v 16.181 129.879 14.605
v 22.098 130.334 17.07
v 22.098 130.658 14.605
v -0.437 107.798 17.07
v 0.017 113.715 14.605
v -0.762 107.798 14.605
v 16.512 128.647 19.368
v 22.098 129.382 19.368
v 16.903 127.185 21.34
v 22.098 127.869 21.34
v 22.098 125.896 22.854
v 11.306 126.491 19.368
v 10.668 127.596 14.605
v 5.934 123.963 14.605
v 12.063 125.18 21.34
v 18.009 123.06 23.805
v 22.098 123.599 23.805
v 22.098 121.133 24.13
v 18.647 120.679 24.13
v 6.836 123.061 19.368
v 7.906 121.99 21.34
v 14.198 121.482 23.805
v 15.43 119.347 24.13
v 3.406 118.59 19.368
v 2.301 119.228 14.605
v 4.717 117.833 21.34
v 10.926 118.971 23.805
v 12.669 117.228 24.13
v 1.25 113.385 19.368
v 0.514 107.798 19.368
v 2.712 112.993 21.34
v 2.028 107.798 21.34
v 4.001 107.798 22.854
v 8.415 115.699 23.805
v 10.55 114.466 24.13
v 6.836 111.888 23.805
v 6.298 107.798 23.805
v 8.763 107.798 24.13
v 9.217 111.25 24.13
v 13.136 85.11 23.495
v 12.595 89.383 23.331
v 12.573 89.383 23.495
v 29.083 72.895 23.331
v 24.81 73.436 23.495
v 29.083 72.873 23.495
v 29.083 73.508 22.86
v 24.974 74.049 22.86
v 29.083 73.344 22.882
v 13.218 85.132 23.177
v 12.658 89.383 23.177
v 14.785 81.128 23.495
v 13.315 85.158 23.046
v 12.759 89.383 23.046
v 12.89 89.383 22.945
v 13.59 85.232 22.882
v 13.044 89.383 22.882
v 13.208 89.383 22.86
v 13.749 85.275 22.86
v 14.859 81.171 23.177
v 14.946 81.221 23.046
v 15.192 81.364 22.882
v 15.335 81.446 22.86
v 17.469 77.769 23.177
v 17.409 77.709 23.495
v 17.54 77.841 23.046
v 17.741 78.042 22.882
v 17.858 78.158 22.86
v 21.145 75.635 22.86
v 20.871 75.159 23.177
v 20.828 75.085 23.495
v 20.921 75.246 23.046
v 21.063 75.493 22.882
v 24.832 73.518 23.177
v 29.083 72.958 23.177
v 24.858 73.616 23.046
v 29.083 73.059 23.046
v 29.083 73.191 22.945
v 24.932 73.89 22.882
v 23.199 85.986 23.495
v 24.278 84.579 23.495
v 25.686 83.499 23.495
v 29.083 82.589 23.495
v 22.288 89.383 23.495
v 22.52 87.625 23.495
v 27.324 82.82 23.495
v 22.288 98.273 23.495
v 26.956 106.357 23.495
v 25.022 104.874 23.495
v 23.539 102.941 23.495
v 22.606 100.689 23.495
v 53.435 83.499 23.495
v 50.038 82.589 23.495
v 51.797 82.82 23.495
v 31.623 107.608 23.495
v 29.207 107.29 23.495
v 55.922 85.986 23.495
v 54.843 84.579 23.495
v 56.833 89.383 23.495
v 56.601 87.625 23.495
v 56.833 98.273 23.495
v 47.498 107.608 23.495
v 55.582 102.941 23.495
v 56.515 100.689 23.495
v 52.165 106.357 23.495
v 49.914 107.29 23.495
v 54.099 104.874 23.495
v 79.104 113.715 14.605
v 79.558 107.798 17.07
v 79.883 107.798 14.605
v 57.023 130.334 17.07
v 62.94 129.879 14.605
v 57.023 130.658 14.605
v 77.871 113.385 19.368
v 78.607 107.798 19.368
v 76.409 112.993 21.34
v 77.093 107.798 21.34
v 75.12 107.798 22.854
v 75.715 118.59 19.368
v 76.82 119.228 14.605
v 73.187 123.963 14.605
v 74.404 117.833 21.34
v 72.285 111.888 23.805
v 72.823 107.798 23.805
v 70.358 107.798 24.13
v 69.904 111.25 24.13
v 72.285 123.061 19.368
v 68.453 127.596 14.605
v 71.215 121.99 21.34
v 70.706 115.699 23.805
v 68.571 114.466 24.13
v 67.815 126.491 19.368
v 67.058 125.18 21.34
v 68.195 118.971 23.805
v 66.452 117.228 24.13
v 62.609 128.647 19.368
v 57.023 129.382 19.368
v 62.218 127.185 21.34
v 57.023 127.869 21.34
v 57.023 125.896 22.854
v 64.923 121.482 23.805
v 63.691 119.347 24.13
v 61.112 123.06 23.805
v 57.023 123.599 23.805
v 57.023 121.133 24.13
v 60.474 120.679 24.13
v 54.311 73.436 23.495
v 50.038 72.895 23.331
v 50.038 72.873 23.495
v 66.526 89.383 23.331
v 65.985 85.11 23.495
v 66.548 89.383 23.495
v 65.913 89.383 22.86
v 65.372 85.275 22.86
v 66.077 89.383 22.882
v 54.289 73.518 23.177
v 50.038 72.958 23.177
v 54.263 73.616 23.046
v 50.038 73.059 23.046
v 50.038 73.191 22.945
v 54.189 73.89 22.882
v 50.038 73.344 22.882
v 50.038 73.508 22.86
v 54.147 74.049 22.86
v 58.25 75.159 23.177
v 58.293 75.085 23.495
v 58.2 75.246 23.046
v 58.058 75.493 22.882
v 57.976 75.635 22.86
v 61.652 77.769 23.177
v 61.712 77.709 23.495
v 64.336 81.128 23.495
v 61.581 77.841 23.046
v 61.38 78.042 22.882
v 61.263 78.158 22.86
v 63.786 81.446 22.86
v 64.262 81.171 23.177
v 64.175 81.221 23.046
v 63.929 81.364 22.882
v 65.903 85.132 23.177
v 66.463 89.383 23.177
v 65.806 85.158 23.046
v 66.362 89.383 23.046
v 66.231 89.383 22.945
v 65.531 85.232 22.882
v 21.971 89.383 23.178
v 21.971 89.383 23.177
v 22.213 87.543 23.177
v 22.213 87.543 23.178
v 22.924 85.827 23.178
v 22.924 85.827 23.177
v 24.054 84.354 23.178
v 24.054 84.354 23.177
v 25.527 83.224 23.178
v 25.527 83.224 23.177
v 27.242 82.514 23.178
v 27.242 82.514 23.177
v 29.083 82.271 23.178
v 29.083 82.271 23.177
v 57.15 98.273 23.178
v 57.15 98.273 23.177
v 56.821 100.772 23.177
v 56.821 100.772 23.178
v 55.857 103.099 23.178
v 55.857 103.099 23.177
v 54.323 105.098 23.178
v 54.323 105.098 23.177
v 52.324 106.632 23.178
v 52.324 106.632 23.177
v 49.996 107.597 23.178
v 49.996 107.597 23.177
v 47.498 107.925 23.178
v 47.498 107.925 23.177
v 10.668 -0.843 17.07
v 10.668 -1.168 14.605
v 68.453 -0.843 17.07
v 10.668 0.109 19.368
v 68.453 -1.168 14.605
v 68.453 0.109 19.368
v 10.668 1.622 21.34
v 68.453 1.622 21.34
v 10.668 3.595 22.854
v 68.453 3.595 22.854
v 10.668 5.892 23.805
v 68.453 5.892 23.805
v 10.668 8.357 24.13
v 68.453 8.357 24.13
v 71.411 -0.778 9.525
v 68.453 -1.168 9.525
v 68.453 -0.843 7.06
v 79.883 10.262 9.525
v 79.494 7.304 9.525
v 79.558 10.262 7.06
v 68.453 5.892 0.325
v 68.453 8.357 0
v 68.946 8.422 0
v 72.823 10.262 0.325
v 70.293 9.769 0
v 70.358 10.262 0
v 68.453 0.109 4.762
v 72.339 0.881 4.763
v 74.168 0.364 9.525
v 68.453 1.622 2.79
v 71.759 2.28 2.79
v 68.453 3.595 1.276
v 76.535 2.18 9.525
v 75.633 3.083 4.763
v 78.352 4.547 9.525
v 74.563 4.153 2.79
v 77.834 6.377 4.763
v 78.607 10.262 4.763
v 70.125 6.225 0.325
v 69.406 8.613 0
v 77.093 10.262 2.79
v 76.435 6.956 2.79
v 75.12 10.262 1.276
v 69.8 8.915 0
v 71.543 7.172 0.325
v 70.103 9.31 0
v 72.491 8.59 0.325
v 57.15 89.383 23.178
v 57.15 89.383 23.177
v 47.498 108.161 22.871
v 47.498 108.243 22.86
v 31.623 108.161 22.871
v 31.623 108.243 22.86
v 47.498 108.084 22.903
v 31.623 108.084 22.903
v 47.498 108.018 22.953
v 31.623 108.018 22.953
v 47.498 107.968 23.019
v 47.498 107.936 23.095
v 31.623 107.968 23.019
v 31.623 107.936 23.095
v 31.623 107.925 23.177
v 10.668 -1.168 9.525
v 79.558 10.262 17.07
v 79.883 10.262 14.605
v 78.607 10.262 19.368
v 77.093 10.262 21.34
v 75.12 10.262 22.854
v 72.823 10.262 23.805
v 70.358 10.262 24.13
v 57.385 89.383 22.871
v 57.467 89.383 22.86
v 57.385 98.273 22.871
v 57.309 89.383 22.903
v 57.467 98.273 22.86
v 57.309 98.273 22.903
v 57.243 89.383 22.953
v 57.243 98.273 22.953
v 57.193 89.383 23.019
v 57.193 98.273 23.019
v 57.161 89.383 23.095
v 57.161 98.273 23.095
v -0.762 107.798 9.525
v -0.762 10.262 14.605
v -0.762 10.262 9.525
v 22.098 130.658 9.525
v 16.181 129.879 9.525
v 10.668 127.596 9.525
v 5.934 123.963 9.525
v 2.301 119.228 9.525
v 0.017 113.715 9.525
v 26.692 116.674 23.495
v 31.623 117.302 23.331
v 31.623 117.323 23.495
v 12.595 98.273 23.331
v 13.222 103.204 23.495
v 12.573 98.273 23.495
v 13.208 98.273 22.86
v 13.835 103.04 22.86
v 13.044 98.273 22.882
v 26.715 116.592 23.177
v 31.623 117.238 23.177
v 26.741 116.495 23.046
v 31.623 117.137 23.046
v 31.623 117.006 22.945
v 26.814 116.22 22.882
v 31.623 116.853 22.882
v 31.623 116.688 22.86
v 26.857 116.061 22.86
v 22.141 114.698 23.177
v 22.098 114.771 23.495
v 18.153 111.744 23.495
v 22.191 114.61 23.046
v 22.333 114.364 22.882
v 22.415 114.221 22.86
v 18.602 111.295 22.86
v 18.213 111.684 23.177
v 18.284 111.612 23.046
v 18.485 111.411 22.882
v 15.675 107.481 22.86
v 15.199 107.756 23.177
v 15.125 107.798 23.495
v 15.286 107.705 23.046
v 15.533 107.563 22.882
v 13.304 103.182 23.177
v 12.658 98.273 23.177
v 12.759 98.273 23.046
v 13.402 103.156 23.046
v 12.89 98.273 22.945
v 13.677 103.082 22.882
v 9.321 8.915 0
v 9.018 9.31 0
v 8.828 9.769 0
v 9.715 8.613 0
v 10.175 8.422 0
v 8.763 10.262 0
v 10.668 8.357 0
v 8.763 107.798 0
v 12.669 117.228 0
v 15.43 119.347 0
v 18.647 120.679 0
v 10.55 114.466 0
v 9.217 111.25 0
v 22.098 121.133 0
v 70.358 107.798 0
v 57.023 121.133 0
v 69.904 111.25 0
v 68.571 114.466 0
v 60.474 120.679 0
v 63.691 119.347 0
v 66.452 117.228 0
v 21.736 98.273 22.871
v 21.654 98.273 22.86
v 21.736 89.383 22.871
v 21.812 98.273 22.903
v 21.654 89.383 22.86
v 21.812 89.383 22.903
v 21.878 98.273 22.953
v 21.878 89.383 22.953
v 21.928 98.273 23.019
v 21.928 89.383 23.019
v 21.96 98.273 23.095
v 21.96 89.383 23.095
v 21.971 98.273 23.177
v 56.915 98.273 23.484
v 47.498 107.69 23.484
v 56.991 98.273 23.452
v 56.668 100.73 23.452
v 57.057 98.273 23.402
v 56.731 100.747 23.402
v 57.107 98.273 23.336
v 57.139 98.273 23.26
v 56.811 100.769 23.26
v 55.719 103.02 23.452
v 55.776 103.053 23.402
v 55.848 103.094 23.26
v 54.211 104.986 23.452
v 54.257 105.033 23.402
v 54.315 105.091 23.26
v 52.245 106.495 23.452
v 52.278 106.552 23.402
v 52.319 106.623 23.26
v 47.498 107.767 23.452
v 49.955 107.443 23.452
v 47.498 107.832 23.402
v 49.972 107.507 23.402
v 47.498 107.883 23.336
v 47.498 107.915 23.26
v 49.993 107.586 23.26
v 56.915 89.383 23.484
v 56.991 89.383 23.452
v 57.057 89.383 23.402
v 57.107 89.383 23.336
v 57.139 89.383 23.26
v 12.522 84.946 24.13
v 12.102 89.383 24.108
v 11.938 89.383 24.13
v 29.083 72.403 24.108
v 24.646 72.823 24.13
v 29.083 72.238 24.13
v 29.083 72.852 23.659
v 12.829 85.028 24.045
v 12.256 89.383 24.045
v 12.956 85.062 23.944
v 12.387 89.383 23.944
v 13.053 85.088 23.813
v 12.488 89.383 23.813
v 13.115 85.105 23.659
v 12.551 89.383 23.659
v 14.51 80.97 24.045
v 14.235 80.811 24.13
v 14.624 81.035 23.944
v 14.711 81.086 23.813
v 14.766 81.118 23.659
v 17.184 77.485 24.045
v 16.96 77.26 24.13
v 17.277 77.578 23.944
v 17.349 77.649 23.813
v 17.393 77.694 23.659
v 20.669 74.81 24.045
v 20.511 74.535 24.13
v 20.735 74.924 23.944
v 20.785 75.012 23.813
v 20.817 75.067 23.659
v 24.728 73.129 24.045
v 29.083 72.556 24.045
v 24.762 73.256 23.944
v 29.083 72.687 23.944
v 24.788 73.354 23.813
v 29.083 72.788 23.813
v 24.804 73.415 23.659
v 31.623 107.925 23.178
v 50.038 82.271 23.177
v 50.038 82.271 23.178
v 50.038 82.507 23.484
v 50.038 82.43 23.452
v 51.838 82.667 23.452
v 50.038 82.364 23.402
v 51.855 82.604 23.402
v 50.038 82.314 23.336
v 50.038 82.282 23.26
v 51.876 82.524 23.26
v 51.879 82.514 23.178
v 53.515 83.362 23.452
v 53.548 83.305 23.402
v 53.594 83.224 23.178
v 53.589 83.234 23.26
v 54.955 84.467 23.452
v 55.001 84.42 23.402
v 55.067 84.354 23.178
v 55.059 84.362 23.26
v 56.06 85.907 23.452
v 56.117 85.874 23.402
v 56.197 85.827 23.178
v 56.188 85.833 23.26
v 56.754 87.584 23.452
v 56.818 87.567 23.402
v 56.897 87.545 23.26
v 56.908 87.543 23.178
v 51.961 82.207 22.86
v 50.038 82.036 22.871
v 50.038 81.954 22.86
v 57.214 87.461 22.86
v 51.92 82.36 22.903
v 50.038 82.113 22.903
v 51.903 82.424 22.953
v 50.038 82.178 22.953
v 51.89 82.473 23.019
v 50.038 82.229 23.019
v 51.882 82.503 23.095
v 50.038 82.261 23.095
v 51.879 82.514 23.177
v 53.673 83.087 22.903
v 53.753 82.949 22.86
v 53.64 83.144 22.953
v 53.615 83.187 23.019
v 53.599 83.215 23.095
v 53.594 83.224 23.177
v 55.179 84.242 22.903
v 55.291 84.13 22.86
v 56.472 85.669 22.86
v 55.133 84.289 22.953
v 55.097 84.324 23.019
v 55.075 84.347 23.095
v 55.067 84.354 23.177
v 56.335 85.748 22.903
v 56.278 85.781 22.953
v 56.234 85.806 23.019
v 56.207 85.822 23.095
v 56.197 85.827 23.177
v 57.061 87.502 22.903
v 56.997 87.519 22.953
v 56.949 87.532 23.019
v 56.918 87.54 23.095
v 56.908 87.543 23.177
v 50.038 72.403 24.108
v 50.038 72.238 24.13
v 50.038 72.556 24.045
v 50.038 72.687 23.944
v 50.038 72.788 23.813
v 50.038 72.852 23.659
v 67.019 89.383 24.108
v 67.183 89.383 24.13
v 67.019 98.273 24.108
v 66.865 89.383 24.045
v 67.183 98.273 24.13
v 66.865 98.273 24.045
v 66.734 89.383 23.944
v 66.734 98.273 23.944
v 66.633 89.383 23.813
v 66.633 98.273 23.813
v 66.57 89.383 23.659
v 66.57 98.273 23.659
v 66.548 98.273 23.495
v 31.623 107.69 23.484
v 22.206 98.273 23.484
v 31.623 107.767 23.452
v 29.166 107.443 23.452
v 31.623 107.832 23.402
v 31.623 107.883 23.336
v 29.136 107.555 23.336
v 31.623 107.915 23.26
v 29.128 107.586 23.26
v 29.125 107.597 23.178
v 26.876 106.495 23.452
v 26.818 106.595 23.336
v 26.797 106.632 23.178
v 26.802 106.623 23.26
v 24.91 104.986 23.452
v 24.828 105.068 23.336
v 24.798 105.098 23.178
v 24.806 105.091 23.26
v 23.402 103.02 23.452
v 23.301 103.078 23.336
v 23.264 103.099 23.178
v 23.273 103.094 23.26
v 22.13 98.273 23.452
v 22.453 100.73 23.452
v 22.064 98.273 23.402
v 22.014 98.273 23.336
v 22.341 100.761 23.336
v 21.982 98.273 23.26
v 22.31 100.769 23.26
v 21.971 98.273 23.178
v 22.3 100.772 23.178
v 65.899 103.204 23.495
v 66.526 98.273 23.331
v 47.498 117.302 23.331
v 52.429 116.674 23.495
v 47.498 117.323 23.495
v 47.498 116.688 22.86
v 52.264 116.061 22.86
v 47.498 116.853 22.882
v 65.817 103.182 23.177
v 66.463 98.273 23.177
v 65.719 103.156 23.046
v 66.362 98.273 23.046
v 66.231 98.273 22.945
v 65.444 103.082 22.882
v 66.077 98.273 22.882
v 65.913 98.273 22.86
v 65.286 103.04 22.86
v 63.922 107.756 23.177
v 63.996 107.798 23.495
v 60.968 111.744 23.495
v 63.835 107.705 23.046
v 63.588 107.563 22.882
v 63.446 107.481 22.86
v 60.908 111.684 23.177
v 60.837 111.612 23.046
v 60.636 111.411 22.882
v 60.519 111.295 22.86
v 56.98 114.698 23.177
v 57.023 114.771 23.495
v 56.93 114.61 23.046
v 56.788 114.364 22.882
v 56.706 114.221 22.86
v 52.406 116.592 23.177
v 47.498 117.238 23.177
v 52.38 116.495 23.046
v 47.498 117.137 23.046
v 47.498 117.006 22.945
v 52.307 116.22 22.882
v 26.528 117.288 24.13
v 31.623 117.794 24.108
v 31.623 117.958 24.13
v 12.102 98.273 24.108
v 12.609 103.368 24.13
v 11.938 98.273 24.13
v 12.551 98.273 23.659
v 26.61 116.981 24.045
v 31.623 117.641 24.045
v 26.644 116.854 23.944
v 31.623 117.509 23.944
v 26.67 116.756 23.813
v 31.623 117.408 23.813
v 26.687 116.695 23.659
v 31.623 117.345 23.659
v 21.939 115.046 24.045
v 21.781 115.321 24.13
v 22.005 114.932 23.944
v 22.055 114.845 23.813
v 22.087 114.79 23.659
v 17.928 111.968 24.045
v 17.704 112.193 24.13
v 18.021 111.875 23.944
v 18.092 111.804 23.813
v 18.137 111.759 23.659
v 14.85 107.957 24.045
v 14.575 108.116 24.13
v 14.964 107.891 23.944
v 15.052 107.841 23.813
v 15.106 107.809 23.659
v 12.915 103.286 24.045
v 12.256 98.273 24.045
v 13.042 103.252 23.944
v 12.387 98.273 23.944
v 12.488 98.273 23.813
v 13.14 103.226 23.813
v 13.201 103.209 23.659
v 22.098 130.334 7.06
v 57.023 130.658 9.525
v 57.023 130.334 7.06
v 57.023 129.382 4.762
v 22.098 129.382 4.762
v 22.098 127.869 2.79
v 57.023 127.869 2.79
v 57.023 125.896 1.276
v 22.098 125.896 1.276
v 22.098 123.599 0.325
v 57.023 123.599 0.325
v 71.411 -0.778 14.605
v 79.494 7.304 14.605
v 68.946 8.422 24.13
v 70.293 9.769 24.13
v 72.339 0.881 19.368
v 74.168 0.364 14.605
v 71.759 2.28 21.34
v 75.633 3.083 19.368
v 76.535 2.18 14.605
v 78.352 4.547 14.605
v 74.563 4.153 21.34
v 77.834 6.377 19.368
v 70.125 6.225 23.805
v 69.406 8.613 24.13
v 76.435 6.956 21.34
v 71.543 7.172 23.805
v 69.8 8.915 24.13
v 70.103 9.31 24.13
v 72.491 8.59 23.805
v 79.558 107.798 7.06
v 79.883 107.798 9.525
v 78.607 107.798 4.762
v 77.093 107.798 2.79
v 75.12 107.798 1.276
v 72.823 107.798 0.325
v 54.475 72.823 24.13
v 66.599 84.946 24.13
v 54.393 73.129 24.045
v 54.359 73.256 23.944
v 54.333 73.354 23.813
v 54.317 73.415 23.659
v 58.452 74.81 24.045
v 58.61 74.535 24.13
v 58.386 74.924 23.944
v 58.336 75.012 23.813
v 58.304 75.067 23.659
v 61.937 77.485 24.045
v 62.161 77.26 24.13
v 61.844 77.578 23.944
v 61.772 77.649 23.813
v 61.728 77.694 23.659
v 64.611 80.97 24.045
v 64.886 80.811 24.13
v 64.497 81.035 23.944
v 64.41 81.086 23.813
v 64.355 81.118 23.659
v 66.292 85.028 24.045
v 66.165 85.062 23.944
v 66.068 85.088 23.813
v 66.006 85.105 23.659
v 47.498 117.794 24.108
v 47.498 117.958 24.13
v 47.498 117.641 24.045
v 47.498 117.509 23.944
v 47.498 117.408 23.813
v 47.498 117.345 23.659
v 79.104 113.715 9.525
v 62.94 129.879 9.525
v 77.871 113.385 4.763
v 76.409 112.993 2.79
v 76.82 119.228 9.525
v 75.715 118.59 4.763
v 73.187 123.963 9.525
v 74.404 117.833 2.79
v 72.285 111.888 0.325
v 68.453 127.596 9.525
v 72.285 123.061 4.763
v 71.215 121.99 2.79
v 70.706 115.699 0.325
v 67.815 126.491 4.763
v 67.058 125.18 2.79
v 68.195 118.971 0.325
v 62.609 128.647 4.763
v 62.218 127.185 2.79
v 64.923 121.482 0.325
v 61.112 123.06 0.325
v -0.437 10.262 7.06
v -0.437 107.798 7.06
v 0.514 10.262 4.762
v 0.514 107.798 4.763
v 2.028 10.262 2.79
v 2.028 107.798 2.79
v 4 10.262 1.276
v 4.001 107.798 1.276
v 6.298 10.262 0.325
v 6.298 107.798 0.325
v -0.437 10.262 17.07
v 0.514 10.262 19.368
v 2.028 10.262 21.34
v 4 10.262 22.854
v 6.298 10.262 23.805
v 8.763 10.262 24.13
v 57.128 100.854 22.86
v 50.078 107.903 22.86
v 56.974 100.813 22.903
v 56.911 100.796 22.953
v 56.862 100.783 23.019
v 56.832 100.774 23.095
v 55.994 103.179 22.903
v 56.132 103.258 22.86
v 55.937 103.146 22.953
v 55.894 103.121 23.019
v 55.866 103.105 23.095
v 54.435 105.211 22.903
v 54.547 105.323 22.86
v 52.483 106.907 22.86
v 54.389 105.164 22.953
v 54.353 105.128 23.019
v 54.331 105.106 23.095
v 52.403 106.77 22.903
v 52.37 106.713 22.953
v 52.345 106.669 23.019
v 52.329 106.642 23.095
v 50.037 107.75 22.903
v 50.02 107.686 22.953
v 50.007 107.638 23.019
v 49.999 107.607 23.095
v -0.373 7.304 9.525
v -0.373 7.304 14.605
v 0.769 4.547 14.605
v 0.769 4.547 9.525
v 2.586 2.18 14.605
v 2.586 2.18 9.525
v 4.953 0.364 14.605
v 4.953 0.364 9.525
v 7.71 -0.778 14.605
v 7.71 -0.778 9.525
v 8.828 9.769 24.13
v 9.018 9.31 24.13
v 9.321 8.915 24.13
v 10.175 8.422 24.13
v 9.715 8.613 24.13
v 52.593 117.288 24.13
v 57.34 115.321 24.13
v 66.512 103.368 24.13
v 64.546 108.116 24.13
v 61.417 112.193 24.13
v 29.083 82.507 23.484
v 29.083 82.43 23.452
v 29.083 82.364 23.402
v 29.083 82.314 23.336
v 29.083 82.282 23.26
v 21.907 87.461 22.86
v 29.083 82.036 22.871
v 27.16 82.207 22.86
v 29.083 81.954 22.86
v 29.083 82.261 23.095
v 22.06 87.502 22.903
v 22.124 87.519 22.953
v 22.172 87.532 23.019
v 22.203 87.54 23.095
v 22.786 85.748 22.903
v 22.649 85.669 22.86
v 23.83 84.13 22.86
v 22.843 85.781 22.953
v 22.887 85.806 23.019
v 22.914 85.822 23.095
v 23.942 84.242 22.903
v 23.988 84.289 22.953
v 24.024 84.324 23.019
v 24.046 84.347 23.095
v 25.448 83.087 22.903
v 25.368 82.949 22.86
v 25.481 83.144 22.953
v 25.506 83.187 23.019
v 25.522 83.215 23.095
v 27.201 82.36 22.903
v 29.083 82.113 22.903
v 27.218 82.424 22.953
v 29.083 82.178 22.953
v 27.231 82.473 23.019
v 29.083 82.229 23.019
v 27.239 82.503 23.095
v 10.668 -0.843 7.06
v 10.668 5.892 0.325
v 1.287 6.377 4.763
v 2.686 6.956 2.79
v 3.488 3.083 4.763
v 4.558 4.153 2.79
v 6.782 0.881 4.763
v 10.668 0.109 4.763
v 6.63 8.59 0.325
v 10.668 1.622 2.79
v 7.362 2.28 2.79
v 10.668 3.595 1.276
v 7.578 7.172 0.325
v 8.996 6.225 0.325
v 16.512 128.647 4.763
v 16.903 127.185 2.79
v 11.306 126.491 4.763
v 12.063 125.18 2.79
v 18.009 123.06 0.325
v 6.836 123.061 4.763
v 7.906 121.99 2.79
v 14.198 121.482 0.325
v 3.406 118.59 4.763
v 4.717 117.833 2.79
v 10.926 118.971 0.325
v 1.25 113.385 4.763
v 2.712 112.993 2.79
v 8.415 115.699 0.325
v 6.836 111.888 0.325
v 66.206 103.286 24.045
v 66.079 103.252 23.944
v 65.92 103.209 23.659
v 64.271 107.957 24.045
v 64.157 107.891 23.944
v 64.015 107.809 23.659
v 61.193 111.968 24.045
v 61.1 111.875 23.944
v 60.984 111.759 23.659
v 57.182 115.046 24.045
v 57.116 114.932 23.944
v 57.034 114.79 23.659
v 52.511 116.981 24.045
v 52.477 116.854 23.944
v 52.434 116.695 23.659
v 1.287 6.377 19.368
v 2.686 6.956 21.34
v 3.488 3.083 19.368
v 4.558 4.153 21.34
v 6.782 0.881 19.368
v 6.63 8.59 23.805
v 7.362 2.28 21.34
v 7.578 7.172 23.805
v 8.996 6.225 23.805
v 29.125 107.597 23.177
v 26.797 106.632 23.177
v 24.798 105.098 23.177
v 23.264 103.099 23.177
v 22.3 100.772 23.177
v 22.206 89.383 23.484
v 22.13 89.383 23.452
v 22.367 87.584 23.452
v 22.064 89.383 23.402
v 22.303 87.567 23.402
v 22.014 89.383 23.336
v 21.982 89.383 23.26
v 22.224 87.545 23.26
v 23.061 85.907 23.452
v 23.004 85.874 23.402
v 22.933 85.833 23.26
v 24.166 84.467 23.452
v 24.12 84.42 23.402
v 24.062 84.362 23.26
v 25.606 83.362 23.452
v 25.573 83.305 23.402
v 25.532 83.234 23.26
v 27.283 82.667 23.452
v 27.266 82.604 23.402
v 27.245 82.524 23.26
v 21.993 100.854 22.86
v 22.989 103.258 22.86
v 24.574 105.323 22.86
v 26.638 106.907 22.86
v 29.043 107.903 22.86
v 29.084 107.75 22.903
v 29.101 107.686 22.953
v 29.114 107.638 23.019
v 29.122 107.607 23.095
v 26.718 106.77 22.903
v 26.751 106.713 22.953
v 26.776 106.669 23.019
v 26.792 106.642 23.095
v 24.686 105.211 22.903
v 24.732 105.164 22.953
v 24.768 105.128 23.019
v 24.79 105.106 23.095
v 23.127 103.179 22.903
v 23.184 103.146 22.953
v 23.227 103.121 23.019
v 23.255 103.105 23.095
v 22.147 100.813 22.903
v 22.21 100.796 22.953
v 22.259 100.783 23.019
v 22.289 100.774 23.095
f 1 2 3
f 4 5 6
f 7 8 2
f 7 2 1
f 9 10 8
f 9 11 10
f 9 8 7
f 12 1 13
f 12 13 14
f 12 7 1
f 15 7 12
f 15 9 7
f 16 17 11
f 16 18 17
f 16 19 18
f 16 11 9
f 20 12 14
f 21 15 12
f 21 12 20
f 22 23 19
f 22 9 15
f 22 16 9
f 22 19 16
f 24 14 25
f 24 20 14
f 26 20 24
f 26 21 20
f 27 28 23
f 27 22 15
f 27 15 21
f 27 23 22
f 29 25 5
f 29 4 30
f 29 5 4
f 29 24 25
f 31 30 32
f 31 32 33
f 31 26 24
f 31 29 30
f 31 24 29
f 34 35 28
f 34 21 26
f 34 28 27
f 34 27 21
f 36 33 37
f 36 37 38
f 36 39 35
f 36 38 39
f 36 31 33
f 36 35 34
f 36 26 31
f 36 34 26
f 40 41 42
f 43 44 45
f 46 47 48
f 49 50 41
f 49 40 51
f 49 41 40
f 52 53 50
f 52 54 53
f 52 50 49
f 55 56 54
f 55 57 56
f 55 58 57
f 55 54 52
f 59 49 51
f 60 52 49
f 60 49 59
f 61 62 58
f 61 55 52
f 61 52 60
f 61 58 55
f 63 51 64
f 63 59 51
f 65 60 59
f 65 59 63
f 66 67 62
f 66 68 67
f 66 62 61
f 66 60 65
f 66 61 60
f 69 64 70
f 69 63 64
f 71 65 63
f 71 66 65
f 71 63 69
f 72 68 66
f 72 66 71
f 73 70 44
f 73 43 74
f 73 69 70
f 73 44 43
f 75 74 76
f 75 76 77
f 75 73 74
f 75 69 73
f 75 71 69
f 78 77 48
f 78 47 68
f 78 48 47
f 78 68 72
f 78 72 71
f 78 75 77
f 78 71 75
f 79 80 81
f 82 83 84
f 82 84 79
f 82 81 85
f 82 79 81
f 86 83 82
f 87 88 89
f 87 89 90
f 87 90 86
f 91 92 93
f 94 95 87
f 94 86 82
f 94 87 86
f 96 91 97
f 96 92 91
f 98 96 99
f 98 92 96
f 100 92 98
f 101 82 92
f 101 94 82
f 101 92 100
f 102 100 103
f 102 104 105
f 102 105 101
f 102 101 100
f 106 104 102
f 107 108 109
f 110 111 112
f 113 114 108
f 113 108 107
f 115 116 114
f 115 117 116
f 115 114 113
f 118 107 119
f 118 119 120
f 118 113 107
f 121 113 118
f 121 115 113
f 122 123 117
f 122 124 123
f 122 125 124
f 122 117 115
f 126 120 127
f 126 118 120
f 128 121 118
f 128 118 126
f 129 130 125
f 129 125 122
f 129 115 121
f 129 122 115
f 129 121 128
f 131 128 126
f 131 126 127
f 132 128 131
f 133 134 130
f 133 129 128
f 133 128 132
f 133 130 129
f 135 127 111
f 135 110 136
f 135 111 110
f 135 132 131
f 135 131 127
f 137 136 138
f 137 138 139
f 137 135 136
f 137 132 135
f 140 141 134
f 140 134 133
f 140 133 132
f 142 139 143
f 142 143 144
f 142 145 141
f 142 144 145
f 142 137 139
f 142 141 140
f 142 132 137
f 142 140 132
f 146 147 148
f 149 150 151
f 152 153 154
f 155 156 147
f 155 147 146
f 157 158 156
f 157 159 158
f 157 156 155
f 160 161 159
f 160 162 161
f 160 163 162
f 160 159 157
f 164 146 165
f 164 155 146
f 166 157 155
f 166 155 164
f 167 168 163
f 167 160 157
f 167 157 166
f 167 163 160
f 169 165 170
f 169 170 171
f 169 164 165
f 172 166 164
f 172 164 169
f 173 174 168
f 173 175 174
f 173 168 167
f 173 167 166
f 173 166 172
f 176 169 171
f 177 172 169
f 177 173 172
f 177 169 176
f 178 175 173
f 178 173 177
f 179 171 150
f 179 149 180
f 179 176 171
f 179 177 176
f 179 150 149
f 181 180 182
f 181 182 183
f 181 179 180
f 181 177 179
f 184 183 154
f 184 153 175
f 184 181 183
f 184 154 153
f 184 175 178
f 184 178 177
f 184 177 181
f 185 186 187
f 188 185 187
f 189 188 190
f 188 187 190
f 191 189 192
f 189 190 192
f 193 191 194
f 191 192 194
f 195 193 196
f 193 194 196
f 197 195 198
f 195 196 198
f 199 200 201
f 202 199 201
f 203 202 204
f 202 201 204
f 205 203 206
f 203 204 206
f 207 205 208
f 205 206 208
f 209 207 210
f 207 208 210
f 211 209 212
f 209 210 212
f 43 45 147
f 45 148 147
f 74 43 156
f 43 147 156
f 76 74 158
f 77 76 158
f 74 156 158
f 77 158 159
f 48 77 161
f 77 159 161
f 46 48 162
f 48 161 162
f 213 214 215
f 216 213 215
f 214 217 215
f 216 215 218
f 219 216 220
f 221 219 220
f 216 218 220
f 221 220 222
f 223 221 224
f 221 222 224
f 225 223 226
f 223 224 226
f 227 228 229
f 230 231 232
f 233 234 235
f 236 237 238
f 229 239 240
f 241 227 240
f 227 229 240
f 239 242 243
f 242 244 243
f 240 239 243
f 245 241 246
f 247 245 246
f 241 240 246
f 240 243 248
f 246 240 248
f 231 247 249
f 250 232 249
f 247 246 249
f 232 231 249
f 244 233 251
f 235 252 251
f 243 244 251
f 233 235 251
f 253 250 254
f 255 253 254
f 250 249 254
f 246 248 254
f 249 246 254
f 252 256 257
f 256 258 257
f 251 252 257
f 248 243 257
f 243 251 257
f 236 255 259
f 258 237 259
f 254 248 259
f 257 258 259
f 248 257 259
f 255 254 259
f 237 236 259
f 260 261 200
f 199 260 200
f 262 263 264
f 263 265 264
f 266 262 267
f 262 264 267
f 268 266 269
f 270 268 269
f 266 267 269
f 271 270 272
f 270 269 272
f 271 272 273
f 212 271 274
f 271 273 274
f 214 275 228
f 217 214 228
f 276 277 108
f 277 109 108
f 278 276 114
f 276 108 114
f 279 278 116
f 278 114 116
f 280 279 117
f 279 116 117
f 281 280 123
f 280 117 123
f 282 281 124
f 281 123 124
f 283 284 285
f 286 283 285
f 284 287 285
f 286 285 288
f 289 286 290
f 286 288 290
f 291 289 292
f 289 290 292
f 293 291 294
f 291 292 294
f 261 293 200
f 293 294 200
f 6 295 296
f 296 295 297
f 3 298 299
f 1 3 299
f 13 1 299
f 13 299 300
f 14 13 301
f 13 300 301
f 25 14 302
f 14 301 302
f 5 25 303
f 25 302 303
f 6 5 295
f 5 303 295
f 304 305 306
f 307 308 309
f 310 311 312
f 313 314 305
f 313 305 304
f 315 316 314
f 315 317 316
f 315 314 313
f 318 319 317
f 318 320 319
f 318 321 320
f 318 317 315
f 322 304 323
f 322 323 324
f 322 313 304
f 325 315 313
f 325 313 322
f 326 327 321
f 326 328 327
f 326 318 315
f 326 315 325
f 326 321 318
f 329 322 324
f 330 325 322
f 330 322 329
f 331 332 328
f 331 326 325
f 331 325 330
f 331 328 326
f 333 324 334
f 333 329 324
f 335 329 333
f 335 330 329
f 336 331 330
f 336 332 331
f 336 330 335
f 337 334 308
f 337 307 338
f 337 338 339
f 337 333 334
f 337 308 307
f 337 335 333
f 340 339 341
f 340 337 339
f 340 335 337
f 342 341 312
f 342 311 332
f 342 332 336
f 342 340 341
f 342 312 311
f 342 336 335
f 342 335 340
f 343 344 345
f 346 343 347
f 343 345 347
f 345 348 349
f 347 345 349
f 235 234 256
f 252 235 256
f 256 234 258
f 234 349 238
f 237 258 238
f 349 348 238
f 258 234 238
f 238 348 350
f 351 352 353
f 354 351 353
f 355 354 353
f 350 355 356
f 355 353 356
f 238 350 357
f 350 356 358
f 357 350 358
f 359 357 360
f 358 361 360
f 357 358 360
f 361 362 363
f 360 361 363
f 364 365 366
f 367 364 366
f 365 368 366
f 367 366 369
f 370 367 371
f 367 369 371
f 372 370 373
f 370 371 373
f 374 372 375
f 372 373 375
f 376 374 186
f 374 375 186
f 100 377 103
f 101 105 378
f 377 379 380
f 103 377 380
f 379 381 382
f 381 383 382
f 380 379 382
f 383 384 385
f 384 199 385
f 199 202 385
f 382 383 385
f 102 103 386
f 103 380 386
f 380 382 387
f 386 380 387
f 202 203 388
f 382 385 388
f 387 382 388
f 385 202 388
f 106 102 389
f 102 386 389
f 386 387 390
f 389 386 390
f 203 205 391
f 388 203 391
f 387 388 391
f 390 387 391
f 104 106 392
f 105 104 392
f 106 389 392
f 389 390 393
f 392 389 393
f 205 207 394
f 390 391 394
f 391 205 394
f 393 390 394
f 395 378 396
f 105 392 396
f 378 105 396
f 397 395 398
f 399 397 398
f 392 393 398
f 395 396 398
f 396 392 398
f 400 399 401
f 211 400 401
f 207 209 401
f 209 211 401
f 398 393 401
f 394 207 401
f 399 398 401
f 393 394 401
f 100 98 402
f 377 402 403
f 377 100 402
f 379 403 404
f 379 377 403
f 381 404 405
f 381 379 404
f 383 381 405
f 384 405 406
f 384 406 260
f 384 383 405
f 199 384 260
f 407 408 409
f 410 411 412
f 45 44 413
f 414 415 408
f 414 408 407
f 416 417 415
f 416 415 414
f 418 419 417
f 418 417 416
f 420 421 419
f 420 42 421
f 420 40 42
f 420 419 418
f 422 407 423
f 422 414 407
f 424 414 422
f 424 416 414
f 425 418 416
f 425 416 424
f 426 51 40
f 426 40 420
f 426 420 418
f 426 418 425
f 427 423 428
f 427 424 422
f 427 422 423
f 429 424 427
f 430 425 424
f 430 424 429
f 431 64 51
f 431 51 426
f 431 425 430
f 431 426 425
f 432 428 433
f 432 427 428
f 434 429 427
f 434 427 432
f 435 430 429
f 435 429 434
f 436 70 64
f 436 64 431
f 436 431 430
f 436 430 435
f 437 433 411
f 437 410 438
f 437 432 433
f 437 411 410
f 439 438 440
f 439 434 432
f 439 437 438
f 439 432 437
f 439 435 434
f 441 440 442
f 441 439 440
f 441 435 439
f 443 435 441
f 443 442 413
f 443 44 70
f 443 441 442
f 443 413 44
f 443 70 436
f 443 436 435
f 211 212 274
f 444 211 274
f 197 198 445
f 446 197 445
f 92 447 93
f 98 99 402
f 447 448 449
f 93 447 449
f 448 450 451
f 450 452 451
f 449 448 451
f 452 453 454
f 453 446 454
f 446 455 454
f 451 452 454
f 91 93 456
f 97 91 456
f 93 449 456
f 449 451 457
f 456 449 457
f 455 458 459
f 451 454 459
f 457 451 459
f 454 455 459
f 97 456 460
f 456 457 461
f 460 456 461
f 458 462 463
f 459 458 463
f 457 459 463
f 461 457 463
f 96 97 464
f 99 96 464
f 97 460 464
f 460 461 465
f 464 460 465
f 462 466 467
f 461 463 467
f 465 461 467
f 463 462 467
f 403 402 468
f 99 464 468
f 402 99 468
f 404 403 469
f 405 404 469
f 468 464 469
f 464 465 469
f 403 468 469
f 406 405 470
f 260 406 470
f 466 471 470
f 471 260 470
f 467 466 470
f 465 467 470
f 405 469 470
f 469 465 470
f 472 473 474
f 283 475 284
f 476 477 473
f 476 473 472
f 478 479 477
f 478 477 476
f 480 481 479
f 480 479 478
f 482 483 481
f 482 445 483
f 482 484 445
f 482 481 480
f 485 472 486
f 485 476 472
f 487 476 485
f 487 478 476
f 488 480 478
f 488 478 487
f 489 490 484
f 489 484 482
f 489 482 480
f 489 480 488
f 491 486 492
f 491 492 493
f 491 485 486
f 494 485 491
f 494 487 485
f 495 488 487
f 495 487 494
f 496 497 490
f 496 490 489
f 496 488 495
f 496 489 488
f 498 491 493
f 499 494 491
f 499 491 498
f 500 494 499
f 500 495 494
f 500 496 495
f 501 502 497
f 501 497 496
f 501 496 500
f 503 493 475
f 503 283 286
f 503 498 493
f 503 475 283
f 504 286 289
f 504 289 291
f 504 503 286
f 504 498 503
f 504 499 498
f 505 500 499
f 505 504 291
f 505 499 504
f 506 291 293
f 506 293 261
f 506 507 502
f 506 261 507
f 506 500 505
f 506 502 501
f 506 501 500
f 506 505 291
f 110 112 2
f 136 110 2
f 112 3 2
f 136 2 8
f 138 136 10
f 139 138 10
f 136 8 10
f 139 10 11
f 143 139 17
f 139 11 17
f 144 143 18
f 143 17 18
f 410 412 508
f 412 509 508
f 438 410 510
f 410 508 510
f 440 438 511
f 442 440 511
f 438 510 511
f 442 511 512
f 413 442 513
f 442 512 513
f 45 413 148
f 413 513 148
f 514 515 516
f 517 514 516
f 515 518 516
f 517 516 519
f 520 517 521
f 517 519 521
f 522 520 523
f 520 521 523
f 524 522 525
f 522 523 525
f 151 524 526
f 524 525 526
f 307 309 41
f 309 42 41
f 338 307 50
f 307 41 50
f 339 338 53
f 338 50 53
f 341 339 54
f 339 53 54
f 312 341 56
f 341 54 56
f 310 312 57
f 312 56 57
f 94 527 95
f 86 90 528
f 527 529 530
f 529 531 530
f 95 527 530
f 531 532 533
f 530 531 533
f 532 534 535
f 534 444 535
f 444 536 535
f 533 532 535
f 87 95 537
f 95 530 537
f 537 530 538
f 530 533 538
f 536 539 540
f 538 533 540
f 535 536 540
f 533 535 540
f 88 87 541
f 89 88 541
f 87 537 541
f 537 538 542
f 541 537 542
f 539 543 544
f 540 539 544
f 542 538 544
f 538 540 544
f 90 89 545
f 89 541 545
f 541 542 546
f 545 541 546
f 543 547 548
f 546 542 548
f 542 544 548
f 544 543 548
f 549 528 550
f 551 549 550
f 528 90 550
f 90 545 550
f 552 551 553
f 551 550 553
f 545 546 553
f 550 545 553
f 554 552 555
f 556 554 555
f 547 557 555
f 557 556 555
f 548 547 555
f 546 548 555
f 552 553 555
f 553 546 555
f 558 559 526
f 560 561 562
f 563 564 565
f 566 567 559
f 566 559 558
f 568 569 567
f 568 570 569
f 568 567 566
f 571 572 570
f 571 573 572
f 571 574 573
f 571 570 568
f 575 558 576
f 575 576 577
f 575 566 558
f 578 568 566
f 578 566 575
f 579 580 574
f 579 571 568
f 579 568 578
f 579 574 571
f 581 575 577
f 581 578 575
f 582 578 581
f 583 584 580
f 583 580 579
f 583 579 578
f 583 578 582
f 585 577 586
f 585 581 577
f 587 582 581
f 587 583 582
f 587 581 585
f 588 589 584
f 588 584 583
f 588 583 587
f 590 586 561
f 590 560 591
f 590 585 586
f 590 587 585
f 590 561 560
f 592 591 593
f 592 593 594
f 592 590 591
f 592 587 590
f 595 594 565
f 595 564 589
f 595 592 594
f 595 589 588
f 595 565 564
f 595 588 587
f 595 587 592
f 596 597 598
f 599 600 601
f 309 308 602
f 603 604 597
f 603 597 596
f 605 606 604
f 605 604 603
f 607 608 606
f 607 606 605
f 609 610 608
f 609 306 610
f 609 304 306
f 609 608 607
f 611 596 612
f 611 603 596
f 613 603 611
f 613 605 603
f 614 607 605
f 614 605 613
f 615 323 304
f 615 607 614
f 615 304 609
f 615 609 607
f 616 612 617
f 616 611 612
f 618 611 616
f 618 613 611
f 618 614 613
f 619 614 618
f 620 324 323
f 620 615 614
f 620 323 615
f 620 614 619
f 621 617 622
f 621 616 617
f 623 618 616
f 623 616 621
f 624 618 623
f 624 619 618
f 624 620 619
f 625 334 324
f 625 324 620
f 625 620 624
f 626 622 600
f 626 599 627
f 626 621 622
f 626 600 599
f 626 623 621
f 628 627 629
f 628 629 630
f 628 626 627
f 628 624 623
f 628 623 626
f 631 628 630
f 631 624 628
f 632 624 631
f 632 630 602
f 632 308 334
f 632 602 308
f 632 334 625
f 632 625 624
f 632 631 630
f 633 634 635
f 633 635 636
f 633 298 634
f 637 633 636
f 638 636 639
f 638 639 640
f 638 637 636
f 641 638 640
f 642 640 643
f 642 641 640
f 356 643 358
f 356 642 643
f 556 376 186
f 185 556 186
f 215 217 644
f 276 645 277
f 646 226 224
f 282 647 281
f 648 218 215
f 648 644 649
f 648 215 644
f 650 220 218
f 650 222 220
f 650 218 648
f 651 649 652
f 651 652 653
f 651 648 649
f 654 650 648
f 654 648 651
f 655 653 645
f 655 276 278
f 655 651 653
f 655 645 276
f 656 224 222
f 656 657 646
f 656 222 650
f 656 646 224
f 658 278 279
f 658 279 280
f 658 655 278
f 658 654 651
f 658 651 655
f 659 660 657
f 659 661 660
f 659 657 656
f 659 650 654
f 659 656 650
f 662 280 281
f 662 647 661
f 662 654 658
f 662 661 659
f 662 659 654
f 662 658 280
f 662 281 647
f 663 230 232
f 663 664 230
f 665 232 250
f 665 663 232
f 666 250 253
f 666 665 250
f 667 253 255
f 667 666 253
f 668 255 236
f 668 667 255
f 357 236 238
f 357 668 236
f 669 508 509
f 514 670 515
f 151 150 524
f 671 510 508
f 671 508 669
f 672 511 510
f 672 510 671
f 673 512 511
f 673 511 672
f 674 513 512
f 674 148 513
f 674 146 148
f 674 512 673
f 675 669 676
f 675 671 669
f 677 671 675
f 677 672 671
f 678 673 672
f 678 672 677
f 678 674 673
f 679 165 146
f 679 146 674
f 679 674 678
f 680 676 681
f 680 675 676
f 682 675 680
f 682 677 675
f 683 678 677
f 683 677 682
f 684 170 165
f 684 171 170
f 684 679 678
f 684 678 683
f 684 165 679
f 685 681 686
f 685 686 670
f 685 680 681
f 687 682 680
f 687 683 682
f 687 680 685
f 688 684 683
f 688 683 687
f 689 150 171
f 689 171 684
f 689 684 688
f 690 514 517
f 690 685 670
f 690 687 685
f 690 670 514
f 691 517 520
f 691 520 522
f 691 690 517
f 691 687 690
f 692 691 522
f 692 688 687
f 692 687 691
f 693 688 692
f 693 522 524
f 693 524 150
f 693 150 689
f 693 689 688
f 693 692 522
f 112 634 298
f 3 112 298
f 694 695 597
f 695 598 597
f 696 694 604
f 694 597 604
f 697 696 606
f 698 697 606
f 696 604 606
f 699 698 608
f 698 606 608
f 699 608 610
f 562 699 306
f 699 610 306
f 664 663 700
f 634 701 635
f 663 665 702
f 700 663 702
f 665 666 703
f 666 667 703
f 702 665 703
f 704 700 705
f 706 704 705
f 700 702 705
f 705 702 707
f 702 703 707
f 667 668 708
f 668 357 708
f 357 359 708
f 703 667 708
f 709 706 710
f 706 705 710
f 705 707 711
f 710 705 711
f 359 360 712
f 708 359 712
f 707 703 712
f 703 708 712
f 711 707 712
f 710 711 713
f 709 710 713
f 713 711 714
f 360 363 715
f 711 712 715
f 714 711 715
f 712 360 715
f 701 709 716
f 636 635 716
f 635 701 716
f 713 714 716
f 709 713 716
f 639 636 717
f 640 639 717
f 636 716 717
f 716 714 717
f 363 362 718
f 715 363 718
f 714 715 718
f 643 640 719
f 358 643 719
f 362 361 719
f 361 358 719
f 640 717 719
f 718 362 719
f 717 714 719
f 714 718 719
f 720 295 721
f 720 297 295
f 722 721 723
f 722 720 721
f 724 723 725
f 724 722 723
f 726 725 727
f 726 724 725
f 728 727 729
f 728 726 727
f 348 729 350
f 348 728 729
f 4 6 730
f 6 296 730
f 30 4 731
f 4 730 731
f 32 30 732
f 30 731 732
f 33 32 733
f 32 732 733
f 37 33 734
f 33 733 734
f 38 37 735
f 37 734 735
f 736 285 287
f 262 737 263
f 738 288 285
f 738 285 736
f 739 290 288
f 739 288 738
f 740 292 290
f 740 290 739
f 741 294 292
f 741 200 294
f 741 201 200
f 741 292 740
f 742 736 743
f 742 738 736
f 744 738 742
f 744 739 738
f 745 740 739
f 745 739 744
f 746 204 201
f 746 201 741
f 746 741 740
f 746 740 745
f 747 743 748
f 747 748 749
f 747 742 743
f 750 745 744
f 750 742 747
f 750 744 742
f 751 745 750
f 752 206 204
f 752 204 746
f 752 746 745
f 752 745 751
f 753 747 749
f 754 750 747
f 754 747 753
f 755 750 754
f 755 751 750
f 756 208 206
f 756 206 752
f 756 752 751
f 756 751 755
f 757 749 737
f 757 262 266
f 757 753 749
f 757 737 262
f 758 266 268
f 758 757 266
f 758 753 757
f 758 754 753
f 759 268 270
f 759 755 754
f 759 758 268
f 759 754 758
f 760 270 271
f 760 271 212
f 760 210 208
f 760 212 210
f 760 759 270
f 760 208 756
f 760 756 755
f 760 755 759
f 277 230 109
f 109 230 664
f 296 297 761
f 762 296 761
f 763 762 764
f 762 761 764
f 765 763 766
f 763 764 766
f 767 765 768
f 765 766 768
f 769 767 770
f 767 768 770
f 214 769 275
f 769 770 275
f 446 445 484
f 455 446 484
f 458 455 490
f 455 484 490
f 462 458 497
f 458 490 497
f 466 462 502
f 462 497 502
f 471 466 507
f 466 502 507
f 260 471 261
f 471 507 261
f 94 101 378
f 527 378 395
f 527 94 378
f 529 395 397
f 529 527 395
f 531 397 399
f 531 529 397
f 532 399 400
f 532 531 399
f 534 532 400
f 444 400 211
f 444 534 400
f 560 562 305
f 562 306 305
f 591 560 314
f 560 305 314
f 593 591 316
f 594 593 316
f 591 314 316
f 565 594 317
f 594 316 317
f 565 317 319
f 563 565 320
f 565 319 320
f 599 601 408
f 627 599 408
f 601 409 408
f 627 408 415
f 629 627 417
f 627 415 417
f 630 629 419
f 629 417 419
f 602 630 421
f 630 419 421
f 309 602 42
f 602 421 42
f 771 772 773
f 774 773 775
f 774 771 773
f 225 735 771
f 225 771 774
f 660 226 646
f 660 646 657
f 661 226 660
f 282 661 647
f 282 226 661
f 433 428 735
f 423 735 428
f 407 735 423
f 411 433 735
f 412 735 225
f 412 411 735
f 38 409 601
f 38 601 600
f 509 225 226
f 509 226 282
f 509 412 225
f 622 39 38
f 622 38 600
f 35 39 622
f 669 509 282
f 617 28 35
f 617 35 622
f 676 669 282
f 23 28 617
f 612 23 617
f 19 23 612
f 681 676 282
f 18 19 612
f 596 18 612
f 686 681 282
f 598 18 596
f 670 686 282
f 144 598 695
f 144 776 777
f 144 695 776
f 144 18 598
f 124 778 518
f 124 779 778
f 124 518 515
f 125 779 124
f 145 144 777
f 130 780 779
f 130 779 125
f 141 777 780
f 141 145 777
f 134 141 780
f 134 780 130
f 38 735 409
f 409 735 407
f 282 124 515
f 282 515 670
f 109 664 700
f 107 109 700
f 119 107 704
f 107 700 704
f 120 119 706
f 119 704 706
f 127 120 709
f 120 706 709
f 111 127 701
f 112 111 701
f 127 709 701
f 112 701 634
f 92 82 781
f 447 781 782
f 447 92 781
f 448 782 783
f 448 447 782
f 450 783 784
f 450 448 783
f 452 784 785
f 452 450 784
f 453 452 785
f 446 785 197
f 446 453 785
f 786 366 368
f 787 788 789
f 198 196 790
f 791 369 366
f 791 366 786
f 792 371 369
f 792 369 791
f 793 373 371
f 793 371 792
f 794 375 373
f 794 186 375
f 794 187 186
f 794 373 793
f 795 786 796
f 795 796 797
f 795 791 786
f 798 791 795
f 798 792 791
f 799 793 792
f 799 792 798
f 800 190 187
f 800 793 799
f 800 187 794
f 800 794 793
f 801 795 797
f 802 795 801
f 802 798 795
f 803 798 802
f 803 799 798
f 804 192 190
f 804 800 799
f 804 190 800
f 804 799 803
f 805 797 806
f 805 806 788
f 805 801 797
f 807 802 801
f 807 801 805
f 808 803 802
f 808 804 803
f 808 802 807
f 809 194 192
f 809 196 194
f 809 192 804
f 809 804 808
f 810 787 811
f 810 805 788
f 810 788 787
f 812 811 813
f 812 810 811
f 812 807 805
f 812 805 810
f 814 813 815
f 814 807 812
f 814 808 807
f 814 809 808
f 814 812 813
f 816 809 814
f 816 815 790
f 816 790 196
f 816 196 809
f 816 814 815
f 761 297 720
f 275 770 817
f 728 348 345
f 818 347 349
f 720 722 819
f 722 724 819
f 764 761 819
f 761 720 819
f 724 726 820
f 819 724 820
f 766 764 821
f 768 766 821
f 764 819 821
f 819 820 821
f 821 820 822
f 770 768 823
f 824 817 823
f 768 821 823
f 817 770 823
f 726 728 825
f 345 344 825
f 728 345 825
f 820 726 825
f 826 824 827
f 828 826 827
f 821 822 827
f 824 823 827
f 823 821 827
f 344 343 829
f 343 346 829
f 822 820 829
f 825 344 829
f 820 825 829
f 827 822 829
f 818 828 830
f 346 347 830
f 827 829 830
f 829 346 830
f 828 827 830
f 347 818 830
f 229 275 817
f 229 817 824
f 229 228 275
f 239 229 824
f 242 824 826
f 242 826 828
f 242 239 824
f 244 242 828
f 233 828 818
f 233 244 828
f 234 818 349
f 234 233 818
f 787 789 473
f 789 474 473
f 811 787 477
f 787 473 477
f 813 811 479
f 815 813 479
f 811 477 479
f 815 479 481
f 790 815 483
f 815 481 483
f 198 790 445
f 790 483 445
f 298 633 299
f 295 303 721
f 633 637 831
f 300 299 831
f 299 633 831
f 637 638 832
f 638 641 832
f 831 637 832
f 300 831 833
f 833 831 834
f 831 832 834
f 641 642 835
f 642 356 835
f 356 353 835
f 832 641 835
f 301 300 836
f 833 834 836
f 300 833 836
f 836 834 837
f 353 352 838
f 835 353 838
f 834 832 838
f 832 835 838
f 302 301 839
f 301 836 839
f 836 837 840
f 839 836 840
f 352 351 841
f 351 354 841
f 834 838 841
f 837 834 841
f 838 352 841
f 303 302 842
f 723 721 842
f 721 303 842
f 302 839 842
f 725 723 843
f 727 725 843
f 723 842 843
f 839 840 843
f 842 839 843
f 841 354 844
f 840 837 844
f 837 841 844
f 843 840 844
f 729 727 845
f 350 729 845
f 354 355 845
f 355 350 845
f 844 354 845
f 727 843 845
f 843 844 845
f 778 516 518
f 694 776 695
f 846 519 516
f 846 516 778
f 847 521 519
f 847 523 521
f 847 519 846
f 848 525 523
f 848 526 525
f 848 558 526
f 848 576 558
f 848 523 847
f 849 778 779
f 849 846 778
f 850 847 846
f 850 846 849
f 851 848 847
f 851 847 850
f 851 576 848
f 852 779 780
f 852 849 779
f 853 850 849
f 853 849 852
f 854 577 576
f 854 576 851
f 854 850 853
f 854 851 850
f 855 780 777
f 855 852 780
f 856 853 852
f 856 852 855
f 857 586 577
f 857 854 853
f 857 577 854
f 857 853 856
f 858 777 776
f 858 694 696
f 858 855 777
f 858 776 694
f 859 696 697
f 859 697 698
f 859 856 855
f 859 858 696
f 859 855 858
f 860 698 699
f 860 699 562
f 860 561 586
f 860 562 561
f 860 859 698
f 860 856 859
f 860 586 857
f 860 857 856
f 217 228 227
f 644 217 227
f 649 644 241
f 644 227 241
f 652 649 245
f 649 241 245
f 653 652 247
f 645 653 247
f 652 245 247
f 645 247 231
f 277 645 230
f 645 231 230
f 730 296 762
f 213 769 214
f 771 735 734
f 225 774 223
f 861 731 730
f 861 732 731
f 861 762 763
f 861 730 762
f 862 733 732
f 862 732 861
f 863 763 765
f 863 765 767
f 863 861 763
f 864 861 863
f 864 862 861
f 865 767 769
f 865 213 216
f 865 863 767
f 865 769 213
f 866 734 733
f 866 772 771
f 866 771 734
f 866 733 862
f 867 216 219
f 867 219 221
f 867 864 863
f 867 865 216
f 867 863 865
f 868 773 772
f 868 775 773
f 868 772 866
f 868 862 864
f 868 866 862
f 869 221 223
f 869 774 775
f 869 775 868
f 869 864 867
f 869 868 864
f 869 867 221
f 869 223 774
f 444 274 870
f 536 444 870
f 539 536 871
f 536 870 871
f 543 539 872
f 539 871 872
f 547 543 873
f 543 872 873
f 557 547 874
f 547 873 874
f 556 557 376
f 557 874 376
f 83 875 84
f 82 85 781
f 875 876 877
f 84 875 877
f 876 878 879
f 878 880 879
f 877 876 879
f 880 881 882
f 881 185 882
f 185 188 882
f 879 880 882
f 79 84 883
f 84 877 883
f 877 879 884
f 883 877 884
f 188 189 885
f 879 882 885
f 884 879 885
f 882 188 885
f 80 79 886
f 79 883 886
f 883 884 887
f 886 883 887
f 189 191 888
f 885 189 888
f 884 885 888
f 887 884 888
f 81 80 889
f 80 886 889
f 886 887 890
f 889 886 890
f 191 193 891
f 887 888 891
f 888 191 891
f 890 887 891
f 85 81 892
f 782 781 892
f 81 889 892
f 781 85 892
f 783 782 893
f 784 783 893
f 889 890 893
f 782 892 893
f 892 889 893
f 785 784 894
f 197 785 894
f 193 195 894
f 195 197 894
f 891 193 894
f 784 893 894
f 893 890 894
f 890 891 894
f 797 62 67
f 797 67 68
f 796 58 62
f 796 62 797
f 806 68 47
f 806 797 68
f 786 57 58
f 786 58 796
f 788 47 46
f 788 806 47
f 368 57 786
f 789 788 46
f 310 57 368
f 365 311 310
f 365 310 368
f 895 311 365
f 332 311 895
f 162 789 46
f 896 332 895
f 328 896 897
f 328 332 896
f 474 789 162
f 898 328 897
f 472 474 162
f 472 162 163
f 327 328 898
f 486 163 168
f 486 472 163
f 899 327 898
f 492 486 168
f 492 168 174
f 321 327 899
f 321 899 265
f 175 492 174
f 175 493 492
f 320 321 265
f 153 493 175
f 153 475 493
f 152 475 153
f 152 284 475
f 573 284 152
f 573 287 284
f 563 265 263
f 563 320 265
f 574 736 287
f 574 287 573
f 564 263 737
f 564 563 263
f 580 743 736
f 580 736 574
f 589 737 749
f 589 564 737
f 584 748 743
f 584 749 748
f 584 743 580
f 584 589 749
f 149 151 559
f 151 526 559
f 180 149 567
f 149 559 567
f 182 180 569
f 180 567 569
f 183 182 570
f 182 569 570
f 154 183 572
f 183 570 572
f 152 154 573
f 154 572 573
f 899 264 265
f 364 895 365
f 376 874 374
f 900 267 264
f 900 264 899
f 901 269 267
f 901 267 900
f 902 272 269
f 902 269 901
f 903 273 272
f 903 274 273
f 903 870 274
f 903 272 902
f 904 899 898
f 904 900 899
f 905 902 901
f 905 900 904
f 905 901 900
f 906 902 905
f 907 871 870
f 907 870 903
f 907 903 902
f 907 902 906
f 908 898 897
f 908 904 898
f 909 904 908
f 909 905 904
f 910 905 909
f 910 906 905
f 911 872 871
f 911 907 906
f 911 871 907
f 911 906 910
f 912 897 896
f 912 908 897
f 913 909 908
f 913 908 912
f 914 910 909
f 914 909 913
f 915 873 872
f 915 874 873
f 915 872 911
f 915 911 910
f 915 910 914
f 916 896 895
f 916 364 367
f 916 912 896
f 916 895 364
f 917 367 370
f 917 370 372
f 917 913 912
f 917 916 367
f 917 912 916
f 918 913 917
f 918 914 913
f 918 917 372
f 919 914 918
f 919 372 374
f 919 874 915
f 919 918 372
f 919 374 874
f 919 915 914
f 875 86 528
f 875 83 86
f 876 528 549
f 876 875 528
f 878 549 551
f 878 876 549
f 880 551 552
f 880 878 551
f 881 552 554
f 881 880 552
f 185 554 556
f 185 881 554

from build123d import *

# Parameters (mm, degrees)
BOSS_EXTRUDE1_DEPTH = 24.13
FILLET3_R           = 9.525
CUT_EXTRUDE1_DEPTH  = 1.27
BOSS_EXTRUDE3_START = 22.86
BOSS_EXTRUDE3_DEPTH = 0.635
FILLET4_R           = 0.635
BOSS_EXTRUDE2_DEPTH = 0.635
FILLET6_R           = 0.3175


# Read off the part's stored shape, not the designer's step: Boss-Extrude3
with BuildPart() as part:
    # Sketch1 → Boss-Extrude1 (new body)
    with BuildSketch(Plane.XY):
        with BuildLine():
            Line((10.668, -1.16760682), (68.453, -1.16760682))
            ThreePointArc((68.453, -1.16760682), (76.535230509, 2.180162671), (79.883, 10.26239318))
            Line((79.883, 10.26239318), (79.883, 107.79839318))
            ThreePointArc((79.883, 107.79839318), (73.187461018, 123.962854198), (57.023, 130.65839318))
            Line((57.023, 130.65839318), (22.098, 130.65839318))
            ThreePointArc((22.098, 130.65839318), (5.933538982, 123.962854198), (-0.762, 107.79839318))
            Line((-0.762, 107.79839318), (-0.762, 10.26239318))
            ThreePointArc((-0.762, 10.26239318), (2.585769491, 2.180162671), (10.668, -1.16760682))
        make_face()
    extrude(amount=BOSS_EXTRUDE1_DEPTH)

    # Fillet3
    fillet3_edges = [part.edges().sort_by_distance(p)[0] for p in [
        (5.933538982, 123.962854198, 24.13),
        (39.5605, 130.65839318, 0),
        (73.187461018, 123.962854198, 0),
        (-0.762, 59.03039318, 24.13),
        (2.585769491, 2.180162671, 24.13),
        (39.5605, -1.16760682, 24.13),
        (76.535230509, 2.180162671, 24.13),
        (79.883, 59.03039318, 24.13),
        (73.187461018, 123.962854198, 24.13),
        (39.5605, 130.65839318, 24.13),
        (79.883, 59.03039318, 0),
        (76.535230509, 2.180162671, 0),
        (39.5605, -1.16760682, 0),
        (2.585769491, 2.180162671, 0),
        (-0.762, 59.03039318, 0),
        (5.933538982, 123.962854198, 0),
    ]]
    fillet(fillet3_edges, radius=FILLET3_R)

    # Sketch3 → Cut-Extrude1 (cut)
    with BuildSketch(Plane.XY.offset(24.13)):
        with BuildLine():
            Line((12.573, 98.27339318), (12.573, 89.38339318))
            ThreePointArc((12.573, 89.38339318), (17.408667043, 77.709060222), (29.083, 72.87339318))
            Line((29.083, 72.87339318), (50.038, 72.87339318))
            ThreePointArc((50.038, 72.87339318), (61.712332957, 77.709060222), (66.548, 89.38339318))
            Line((66.548, 89.38339318), (66.548, 98.27339318))
            ThreePointArc((66.548, 98.27339318), (60.968384182, 111.743777361), (47.498, 117.32339318))
            Line((47.498, 117.32339318), (31.623, 117.32339318))
            ThreePointArc((31.623, 117.32339318), (18.152615818, 111.743777361), (12.573, 98.27339318))
        make_face()
    extrude(amount=-CUT_EXTRUDE1_DEPTH, mode=Mode.SUBTRACT)

    # Boss-Extrude3 outline → Boss-Extrude3 (add)
    with BuildSketch(Plane.XY.offset(BOSS_EXTRUDE3_START)):
        with BuildLine():
            ThreePointArc((21.971, 89.38339318), (24.054056572, 84.354449752), (29.083, 82.27139318))
            Line((29.083, 82.27139318), (50.038, 82.27139318))
            ThreePointArc((50.038, 82.27139318), (55.066943428, 84.354449752), (57.15, 89.38339318))
            Line((57.15, 89.38339318), (57.15, 98.27339318))
            ThreePointArc((57.15, 98.27339318), (54.322994652, 105.098387832), (47.498, 107.92539318))
            Line((47.498, 107.92539318), (31.623, 107.92539318))
            ThreePointArc((31.623, 107.92539318), (24.798005348, 105.098387832), (21.971, 98.27339318))
            Line((21.971, 98.27339318), (21.971, 89.38339318))
        make_face()
    extrude(amount=BOSS_EXTRUDE3_DEPTH)

    # Fillet4
    fillet4_edges = [part.edges().sort_by_distance(p)[0] for p in [
        (18.152615818, 111.743777361, 22.86),
        (12.573, 93.82839318, 22.86),
        (17.408667043, 77.709060222, 22.86),
        (39.5605, 72.87339318, 22.86),
        (61.712332957, 77.709060222, 22.86),
        (66.548, 93.82839318, 22.86),
        (60.968384182, 111.743777361, 22.86),
        (39.5605, 117.32339318, 24.13),
        (60.968384182, 111.743777361, 24.13),
        (66.548, 93.82839318, 24.13),
        (61.712332957, 77.709060222, 24.13),
        (39.5605, 72.87339318, 24.13),
        (17.408667043, 77.709060222, 24.13),
        (12.573, 93.82839318, 24.13),
        (39.5605, 117.32339318, 22.86),
        (18.152615818, 111.743777361, 24.13),
    ]]
    fillet(fillet4_edges, radius=FILLET4_R - 0.0001)  # a hair under: the kernel refuses the full size

    # Sketch4 → Boss-Extrude2 (add)
    with BuildSketch(Plane.XY.offset(22.86)):
        with BuildLine():
            Line((57.15, 89.38339318), (57.15, 98.27339318))
            ThreePointArc((57.15, 98.27339318), (54.322994652, 105.098387832), (47.498, 107.92539318))
            Line((47.498, 107.92539318), (31.623, 107.92539318))
            ThreePointArc((31.623, 107.92539318), (24.798005348, 105.098387832), (21.971, 98.27339318))
            Line((21.971, 98.27339318), (21.971, 89.38339318))
            ThreePointArc((21.971, 89.38339318), (24.054056572, 84.354449752), (29.083, 82.27139318))
            Line((29.083, 82.27139318), (50.038, 82.27139318))
            ThreePointArc((50.038, 82.27139318), (55.066943428, 84.354449752), (57.15, 89.38339318))
        make_face()
    extrude(amount=BOSS_EXTRUDE2_DEPTH)

    # Fillet6
    fillet6_edges = [part.edges().sort_by_distance(p)[0] for p in [
        (24.798005348, 105.098387832, 22.86),
        (21.971, 93.82839318, 22.86),
        (24.054056572, 84.354449752, 22.86),
        (39.5605, 82.27139318, 22.86),
        (55.066943428, 84.354449752, 22.86),
        (57.15, 93.82839318, 22.86),
        (54.322994652, 105.098387832, 22.86),
        (21.971, 93.82839318, 23.495),
        (24.798005348, 105.098387832, 23.495),
        (39.5605, 107.92539318, 23.495),
        (54.322994652, 105.098387832, 23.495),
        (57.15, 93.82839318, 23.495),
        (55.066943428, 84.354449752, 23.495),
        (39.5605, 82.27139318, 23.495),
        (24.054056572, 84.354449752, 23.495),
        (39.5605, 107.92539318, 22.86),
    ]]
    fillet(fillet6_edges, radius=FILLET6_R - 0.0001)  # a hair under: the kernel refuses the full size


solid = part.part
